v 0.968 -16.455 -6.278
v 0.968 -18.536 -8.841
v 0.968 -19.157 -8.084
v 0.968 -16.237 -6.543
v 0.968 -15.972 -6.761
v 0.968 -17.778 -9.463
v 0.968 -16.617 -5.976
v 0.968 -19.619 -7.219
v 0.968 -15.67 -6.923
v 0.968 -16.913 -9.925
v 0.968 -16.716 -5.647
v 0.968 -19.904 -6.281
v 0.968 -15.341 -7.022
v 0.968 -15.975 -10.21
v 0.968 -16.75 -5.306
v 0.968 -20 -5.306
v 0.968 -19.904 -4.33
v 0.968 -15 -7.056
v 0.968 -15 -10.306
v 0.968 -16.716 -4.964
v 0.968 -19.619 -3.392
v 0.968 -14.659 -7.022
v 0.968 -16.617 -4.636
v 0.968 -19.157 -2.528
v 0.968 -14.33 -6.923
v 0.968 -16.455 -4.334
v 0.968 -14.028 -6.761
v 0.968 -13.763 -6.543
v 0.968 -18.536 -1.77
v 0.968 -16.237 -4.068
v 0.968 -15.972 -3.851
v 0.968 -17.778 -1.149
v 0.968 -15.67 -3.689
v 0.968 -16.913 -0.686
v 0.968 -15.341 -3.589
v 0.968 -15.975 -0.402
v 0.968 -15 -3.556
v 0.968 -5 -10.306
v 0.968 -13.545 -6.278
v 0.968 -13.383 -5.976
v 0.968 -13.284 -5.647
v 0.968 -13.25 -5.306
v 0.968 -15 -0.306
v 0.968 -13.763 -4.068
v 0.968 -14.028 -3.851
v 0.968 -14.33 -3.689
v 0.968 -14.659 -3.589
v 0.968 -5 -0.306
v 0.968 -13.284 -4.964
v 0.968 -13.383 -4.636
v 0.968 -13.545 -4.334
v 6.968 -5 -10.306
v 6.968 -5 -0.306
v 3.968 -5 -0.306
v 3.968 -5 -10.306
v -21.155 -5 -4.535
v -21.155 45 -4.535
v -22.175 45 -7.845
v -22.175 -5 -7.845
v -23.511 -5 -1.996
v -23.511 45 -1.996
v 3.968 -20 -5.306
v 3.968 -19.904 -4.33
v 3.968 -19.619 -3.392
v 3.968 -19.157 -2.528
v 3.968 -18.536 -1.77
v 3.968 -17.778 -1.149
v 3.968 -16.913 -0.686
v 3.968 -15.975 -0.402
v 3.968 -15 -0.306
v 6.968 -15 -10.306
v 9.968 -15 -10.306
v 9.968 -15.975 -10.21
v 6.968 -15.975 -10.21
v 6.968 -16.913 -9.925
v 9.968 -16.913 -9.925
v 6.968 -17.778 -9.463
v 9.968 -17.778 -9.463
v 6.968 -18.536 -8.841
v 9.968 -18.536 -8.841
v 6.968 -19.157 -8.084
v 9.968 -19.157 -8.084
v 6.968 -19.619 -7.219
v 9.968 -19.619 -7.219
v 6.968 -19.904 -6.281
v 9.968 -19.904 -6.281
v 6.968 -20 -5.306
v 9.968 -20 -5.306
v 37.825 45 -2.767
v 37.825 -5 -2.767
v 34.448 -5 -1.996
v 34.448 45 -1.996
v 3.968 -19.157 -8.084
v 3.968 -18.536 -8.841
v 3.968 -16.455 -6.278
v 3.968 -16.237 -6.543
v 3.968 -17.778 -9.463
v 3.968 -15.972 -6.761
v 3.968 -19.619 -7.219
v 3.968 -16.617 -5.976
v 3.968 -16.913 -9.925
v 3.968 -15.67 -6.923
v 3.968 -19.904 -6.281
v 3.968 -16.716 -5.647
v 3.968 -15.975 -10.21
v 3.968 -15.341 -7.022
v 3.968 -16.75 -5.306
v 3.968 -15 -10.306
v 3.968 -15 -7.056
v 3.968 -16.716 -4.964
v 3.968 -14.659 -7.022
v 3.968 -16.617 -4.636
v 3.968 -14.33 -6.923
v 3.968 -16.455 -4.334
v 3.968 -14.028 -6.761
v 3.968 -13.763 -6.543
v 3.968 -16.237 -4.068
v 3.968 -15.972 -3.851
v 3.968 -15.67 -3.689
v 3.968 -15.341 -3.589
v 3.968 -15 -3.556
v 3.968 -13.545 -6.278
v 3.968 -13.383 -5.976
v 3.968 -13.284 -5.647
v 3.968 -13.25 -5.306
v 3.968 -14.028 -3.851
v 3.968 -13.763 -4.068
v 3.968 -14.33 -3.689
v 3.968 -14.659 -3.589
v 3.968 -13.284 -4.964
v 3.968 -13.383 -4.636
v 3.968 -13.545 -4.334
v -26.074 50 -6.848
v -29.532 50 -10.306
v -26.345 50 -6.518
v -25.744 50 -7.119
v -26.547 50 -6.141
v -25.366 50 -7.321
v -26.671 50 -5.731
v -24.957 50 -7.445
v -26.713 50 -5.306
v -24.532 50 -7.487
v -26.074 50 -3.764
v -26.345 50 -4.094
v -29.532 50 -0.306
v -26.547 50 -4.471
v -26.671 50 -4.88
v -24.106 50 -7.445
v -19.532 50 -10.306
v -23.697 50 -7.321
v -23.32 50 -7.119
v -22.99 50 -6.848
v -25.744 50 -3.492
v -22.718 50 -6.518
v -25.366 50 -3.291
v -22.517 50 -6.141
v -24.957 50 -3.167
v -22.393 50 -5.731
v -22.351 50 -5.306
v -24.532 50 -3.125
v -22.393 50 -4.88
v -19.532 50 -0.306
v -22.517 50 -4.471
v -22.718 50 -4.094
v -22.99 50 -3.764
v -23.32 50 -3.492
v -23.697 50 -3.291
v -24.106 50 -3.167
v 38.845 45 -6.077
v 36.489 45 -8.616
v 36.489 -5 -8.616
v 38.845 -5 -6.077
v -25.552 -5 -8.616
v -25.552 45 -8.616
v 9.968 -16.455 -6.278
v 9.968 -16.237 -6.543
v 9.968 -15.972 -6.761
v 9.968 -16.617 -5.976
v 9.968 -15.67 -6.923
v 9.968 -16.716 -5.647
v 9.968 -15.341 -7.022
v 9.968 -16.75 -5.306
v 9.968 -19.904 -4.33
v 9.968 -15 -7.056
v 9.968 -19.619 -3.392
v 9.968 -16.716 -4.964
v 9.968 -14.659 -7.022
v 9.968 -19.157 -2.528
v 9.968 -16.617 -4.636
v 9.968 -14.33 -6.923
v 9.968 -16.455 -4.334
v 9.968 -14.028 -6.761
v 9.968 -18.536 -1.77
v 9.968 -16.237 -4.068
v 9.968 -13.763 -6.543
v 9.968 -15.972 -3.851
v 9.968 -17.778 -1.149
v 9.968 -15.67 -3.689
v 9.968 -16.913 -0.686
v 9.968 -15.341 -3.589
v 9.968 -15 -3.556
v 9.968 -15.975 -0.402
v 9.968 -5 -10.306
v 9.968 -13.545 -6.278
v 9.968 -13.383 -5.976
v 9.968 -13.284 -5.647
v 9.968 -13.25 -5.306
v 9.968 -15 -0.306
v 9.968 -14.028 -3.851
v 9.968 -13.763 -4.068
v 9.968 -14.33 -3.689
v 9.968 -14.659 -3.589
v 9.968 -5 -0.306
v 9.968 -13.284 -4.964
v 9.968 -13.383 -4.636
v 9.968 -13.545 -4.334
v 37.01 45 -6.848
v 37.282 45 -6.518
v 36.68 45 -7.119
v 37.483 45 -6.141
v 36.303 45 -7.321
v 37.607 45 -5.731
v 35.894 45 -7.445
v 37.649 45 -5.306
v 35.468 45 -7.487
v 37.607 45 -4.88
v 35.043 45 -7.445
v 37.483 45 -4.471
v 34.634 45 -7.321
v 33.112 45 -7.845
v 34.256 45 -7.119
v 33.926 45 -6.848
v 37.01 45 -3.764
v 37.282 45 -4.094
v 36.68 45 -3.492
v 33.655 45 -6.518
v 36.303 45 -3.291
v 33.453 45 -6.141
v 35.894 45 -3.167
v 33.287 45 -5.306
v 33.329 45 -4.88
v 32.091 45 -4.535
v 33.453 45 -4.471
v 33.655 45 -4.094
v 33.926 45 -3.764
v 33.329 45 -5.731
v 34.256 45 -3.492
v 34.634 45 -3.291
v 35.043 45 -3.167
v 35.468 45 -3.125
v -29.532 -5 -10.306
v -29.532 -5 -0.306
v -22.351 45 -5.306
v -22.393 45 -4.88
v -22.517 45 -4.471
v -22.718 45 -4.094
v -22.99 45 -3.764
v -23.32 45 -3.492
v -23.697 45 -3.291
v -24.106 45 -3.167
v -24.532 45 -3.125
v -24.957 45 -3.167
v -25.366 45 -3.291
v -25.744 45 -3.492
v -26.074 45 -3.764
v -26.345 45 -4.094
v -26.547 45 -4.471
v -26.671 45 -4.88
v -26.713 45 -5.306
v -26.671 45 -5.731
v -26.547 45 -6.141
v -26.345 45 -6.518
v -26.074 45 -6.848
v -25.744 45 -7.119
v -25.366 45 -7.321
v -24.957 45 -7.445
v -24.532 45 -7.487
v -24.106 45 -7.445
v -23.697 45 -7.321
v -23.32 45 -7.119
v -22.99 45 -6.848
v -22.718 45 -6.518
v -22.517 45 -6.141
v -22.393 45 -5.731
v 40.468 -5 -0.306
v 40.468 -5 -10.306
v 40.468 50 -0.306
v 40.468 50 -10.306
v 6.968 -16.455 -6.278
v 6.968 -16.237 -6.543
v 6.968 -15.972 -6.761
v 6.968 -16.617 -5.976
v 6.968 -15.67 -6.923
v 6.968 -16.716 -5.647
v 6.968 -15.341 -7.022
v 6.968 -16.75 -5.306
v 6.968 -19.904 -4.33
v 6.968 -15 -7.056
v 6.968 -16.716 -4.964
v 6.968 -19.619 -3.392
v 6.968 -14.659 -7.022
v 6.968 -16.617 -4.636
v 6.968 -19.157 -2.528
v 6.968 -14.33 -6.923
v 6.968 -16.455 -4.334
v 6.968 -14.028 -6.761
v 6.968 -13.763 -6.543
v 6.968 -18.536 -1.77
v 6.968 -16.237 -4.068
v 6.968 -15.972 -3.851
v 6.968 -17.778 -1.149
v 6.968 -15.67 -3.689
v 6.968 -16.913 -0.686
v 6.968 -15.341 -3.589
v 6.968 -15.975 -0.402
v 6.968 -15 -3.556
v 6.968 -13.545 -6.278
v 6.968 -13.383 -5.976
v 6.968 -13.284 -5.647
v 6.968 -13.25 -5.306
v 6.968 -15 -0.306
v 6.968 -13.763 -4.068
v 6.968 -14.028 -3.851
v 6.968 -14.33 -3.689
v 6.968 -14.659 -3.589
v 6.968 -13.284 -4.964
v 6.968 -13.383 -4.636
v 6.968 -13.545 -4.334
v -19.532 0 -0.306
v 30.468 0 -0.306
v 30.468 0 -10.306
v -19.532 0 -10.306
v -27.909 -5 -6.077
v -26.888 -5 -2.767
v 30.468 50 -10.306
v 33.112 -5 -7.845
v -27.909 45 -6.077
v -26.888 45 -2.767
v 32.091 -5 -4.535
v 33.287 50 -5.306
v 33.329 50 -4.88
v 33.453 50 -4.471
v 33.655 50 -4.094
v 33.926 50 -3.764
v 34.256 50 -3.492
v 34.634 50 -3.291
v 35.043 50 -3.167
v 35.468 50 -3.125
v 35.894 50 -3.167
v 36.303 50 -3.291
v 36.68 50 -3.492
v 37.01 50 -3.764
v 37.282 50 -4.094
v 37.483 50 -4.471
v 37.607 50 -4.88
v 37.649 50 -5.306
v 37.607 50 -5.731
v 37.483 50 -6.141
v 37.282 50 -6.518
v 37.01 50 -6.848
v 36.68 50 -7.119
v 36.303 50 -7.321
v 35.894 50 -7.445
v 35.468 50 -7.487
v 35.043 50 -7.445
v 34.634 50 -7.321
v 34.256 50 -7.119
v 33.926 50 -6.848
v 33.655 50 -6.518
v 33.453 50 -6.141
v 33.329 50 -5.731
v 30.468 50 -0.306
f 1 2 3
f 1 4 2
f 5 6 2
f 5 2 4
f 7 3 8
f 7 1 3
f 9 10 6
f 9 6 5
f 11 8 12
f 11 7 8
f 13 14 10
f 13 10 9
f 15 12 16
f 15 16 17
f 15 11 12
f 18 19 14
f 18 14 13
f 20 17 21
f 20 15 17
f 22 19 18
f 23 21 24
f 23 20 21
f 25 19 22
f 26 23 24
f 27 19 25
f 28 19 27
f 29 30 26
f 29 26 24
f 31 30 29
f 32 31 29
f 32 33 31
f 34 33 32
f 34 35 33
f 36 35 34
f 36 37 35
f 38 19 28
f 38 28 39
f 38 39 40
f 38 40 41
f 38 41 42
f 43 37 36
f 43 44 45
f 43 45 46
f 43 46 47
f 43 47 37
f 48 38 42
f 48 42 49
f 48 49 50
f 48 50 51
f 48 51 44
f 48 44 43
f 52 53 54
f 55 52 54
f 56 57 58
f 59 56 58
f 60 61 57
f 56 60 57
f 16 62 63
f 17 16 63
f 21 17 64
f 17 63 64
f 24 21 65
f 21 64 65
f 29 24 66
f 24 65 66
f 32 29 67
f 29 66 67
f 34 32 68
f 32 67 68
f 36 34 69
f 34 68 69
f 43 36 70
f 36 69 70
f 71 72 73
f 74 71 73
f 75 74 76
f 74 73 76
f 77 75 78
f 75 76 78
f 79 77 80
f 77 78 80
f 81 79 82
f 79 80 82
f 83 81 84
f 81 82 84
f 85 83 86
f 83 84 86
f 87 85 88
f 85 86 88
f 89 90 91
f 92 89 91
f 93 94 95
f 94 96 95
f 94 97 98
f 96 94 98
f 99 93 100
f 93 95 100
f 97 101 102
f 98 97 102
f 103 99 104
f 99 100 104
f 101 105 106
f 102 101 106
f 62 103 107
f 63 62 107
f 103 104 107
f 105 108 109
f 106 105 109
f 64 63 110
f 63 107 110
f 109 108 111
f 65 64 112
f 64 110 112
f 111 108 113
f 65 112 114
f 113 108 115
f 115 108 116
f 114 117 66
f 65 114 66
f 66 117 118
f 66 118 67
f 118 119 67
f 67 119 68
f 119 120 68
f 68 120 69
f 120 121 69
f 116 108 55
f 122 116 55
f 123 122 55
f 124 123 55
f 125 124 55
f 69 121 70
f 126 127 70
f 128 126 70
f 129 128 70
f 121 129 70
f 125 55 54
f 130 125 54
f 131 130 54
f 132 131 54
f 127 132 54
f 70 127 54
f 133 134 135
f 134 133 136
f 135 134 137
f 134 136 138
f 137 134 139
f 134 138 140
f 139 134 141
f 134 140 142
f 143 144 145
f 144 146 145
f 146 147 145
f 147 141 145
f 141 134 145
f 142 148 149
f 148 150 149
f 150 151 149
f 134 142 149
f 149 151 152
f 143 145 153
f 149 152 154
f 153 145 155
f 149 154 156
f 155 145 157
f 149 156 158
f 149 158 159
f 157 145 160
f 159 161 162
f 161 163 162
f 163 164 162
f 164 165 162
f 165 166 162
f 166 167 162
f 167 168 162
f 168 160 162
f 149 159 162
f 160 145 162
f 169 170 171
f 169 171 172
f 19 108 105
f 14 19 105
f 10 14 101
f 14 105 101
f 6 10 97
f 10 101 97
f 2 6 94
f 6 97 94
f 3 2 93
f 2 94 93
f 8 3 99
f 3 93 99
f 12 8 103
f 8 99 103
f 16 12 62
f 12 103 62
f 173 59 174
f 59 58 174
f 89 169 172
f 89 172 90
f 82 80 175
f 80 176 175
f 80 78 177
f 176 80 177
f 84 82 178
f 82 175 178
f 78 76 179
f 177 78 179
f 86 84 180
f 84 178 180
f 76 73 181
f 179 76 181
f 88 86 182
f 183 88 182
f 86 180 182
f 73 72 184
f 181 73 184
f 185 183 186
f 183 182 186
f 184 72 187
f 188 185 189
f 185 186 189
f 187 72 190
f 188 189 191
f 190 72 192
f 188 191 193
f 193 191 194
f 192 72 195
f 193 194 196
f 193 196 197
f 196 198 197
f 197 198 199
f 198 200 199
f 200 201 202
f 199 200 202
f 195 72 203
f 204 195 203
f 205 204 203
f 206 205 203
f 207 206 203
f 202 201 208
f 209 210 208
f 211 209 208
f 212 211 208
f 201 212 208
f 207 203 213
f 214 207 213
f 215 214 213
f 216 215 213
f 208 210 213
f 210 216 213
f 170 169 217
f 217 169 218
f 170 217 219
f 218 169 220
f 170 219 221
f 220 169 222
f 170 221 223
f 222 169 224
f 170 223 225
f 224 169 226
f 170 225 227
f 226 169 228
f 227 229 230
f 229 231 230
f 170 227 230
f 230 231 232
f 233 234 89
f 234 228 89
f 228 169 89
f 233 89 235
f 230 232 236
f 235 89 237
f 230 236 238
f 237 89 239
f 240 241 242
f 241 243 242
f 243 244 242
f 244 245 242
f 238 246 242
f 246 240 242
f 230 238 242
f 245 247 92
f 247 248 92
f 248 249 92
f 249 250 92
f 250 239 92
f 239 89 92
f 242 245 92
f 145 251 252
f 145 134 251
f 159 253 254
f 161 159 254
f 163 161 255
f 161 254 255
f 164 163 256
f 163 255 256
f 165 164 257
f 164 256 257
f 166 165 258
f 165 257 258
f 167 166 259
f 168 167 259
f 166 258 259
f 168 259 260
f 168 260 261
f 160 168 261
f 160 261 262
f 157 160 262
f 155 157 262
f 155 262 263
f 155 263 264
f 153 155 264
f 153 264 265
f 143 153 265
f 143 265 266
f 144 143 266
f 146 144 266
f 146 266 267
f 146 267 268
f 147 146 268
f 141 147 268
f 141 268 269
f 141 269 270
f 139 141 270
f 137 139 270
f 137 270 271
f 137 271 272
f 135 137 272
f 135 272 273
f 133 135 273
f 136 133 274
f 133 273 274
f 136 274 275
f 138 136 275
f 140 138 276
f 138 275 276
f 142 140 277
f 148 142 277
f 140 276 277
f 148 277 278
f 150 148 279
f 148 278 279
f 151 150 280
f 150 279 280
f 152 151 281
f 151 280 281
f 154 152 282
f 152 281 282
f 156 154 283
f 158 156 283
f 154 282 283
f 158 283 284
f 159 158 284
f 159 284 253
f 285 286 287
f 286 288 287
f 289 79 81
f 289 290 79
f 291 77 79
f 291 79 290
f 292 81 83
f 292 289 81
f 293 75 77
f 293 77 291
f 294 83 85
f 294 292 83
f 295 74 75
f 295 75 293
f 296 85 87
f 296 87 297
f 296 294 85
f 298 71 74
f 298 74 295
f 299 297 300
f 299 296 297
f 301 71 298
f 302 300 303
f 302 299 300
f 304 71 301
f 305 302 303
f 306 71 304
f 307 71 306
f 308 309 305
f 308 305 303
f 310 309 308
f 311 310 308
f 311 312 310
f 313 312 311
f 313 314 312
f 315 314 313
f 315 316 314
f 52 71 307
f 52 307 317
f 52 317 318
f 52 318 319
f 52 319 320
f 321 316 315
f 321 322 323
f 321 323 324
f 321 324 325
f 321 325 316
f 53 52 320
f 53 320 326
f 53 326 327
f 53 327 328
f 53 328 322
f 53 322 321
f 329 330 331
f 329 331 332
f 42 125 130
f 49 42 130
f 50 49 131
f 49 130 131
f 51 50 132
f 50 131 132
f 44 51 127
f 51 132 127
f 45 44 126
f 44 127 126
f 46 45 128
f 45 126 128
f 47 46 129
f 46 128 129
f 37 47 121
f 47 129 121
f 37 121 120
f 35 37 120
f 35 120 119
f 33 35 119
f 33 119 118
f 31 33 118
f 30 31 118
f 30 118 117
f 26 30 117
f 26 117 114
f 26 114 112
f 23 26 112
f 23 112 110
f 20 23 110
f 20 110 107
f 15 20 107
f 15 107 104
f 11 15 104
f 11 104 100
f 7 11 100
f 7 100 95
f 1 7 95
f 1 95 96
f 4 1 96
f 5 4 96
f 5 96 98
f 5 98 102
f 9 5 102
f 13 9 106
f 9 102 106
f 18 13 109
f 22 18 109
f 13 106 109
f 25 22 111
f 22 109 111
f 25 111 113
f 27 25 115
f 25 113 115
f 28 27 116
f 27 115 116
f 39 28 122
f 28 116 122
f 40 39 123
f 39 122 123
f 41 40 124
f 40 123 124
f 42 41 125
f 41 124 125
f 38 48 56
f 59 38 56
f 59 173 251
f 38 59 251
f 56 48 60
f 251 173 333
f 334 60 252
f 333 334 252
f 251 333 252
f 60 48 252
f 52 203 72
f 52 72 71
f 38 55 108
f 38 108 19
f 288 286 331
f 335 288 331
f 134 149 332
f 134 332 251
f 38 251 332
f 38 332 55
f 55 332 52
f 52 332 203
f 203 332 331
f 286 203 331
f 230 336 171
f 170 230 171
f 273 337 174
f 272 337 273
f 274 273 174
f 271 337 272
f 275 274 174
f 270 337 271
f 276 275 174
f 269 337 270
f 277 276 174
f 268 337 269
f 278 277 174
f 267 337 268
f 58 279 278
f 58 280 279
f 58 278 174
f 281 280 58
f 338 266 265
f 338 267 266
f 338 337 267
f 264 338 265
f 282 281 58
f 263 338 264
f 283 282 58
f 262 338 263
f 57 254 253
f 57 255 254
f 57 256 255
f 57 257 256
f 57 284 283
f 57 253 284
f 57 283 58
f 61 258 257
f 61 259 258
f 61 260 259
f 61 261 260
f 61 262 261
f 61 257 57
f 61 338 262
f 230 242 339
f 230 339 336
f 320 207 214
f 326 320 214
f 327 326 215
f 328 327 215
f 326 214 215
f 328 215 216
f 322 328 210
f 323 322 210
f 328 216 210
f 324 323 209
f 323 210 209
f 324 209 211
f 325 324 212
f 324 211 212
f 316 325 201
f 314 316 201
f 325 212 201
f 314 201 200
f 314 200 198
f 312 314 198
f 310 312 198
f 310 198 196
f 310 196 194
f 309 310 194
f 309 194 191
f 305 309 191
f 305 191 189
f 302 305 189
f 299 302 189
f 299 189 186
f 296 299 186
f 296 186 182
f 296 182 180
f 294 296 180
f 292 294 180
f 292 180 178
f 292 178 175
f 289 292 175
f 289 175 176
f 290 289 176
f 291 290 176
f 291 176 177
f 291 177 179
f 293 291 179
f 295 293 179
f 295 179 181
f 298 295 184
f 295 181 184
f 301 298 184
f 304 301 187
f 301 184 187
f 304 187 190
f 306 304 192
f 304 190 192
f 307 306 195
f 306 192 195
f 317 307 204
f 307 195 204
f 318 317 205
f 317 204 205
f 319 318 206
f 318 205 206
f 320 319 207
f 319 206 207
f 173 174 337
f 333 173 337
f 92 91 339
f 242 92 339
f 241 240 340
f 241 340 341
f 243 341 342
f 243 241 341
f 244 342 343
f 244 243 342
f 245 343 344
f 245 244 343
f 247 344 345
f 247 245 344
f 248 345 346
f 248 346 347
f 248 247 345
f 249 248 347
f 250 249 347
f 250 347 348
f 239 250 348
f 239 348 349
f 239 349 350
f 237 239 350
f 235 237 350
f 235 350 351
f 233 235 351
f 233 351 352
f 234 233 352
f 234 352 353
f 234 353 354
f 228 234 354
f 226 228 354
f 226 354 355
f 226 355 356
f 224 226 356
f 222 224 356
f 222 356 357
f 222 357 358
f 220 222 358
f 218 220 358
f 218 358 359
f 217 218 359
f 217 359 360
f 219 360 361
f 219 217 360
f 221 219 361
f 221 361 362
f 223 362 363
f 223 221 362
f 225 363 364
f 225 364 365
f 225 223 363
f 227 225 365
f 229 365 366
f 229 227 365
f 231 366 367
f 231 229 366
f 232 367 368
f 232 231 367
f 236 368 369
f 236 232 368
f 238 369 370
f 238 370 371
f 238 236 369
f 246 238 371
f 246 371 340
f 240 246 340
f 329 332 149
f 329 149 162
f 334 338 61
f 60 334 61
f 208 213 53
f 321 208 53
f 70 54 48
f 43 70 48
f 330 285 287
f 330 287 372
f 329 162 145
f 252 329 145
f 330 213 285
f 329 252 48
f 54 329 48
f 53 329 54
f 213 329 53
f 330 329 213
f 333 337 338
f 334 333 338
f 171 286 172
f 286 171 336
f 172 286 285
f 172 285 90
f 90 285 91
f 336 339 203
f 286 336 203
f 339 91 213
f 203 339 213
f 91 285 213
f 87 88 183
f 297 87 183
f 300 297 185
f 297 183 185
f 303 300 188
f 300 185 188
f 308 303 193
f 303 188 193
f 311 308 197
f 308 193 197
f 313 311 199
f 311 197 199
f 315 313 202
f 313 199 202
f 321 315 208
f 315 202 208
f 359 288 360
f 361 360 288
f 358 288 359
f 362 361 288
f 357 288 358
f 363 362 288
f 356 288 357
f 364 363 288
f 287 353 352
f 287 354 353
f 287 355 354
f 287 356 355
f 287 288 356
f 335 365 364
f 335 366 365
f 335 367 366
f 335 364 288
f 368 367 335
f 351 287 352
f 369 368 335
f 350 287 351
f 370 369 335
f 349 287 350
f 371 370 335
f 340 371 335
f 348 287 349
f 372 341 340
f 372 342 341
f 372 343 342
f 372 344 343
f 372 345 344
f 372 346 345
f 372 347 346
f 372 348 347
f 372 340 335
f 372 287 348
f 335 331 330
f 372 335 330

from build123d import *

# Parameters (mm, degrees)
F0_W      = 10
F0_H      = 10
F0_R      = 2.18110555
F1_DEPTH  = 50
F2_R      = 2.18110555
F2_R_2    = 1.75
F3_DEPTH  = 45
F4_W      = 35
F4_H      = 10
F5_DEPTH  = 5
F7_W      = 3
F7_H      = 10
F8_DEPTH  = 15
F9_R      = 1.75
F10_DEPTH = 39.501


# Not quite as in the source:
# - a feature names something its author has since deleted; it is built from what else it names


with BuildPart() as f1:
    # F0 (on Front) → F1 (new body)
    with BuildSketch(Plane.XZ):
        with Locations((-24.531819516, -5.3058740483)):
            Rectangle(F0_W, F0_H)
        with Locations((-24.531819516, -5.3058740483)):
            Circle(F0_R, mode=Mode.SUBTRACT)
    extrude(amount=-F1_DEPTH)

    # F2 (on face) → F3 (cut)
    with BuildSketch(Plane.XZ):
        Polygon((-22.1752951329, -7.844927579), (-21.1546724653, -4.5345908332), (-23.5111968485, -1.9955373025), (-26.8883438992, -2.7668205176), (-27.9089665667, -6.0771572634), (-25.5524421836, -8.6162107941), align=None)
        with Locations((-24.531819516, -5.3058740483)):
            Circle(F2_R, mode=Mode.SUBTRACT)
        Polygon((36.9860127402, -8.419743866), (38.9237869783, -5.5483276646), (37.4059547221, -2.4344578468), (33.9503482277, -2.1920042306), (32.0125739896, -5.063420432), (33.5304062458, -8.1772902498), align=None)
        with Locations((35.468180484, -5.3058740483)):
            Circle(F2_R_2, mode=Mode.SUBTRACT)
    extrude(amount=-F3_DEPTH, mode=Mode.SUBTRACT)

    # F4 (on face) → F5 (join)
    with BuildSketch(Plane.XZ):
        with Locations((-12.031819516, -5.3058740483)):
            Rectangle(F4_W, F4_H)
        Polygon((-22.1752951329, -7.844927579), (-25.5524421836, -8.6162107941), (-27.9089665667, -6.0771572634), (-26.8883438992, -2.7668205176), (-23.5111968485, -1.9955373025), (-21.1546724653, -4.5345908332), align=None, mode=Mode.SUBTRACT)
    extrude(amount=F5_DEPTH)

    # F6: F1 across face


with BuildPart() as f1_1:
    add(f1.part)
    add(f1.part.mirror(Plane(origin=(5.468180484, -2.5, -5.3058740483), x_dir=(0, 1, 0), z_dir=(1, 0, 0))))

    # F7 (on face) → F8 (join)
    with BuildSketch(Plane.XZ.offset(5)):
        with Locations((8.468180484, -5.3058740483)):
            Rectangle(F7_W, F7_H)
        with Locations((2.468180484, -5.3058740483)):
            Rectangle(F7_W, F7_H)
    extrude(amount=F8_DEPTH)

    # F9 (on face) → F10 (cut, through all)
    with BuildSketch(Plane.YZ.offset(9.968180484)):
        with BuildLine():
            ThreePointArc((-20, -5.3058740483), (-18.5355339059, -1.7703401424), (-15, -0.3058740483))
            Line((-15, -0.3058740483), (-20, -0.3058740483))
            Line((-20, -0.3058740483), (-20, -5.3058740483))
        make_face()
        with Locations((-15, -5.3058740483)):
            Circle(F9_R)
        with BuildLine():
            ThreePointArc((-15, -10.3058740483), (-18.5355339059, -8.8414079542), (-20, -5.3058740483))
            Line((-20, -5.3058740483), (-20, -10.3058740483))
            Line((-20, -10.3058740483), (-15, -10.3058740483))
        make_face()
    extrude(amount=-F10_DEPTH, mode=Mode.SUBTRACT)


solid = f1_1.part
